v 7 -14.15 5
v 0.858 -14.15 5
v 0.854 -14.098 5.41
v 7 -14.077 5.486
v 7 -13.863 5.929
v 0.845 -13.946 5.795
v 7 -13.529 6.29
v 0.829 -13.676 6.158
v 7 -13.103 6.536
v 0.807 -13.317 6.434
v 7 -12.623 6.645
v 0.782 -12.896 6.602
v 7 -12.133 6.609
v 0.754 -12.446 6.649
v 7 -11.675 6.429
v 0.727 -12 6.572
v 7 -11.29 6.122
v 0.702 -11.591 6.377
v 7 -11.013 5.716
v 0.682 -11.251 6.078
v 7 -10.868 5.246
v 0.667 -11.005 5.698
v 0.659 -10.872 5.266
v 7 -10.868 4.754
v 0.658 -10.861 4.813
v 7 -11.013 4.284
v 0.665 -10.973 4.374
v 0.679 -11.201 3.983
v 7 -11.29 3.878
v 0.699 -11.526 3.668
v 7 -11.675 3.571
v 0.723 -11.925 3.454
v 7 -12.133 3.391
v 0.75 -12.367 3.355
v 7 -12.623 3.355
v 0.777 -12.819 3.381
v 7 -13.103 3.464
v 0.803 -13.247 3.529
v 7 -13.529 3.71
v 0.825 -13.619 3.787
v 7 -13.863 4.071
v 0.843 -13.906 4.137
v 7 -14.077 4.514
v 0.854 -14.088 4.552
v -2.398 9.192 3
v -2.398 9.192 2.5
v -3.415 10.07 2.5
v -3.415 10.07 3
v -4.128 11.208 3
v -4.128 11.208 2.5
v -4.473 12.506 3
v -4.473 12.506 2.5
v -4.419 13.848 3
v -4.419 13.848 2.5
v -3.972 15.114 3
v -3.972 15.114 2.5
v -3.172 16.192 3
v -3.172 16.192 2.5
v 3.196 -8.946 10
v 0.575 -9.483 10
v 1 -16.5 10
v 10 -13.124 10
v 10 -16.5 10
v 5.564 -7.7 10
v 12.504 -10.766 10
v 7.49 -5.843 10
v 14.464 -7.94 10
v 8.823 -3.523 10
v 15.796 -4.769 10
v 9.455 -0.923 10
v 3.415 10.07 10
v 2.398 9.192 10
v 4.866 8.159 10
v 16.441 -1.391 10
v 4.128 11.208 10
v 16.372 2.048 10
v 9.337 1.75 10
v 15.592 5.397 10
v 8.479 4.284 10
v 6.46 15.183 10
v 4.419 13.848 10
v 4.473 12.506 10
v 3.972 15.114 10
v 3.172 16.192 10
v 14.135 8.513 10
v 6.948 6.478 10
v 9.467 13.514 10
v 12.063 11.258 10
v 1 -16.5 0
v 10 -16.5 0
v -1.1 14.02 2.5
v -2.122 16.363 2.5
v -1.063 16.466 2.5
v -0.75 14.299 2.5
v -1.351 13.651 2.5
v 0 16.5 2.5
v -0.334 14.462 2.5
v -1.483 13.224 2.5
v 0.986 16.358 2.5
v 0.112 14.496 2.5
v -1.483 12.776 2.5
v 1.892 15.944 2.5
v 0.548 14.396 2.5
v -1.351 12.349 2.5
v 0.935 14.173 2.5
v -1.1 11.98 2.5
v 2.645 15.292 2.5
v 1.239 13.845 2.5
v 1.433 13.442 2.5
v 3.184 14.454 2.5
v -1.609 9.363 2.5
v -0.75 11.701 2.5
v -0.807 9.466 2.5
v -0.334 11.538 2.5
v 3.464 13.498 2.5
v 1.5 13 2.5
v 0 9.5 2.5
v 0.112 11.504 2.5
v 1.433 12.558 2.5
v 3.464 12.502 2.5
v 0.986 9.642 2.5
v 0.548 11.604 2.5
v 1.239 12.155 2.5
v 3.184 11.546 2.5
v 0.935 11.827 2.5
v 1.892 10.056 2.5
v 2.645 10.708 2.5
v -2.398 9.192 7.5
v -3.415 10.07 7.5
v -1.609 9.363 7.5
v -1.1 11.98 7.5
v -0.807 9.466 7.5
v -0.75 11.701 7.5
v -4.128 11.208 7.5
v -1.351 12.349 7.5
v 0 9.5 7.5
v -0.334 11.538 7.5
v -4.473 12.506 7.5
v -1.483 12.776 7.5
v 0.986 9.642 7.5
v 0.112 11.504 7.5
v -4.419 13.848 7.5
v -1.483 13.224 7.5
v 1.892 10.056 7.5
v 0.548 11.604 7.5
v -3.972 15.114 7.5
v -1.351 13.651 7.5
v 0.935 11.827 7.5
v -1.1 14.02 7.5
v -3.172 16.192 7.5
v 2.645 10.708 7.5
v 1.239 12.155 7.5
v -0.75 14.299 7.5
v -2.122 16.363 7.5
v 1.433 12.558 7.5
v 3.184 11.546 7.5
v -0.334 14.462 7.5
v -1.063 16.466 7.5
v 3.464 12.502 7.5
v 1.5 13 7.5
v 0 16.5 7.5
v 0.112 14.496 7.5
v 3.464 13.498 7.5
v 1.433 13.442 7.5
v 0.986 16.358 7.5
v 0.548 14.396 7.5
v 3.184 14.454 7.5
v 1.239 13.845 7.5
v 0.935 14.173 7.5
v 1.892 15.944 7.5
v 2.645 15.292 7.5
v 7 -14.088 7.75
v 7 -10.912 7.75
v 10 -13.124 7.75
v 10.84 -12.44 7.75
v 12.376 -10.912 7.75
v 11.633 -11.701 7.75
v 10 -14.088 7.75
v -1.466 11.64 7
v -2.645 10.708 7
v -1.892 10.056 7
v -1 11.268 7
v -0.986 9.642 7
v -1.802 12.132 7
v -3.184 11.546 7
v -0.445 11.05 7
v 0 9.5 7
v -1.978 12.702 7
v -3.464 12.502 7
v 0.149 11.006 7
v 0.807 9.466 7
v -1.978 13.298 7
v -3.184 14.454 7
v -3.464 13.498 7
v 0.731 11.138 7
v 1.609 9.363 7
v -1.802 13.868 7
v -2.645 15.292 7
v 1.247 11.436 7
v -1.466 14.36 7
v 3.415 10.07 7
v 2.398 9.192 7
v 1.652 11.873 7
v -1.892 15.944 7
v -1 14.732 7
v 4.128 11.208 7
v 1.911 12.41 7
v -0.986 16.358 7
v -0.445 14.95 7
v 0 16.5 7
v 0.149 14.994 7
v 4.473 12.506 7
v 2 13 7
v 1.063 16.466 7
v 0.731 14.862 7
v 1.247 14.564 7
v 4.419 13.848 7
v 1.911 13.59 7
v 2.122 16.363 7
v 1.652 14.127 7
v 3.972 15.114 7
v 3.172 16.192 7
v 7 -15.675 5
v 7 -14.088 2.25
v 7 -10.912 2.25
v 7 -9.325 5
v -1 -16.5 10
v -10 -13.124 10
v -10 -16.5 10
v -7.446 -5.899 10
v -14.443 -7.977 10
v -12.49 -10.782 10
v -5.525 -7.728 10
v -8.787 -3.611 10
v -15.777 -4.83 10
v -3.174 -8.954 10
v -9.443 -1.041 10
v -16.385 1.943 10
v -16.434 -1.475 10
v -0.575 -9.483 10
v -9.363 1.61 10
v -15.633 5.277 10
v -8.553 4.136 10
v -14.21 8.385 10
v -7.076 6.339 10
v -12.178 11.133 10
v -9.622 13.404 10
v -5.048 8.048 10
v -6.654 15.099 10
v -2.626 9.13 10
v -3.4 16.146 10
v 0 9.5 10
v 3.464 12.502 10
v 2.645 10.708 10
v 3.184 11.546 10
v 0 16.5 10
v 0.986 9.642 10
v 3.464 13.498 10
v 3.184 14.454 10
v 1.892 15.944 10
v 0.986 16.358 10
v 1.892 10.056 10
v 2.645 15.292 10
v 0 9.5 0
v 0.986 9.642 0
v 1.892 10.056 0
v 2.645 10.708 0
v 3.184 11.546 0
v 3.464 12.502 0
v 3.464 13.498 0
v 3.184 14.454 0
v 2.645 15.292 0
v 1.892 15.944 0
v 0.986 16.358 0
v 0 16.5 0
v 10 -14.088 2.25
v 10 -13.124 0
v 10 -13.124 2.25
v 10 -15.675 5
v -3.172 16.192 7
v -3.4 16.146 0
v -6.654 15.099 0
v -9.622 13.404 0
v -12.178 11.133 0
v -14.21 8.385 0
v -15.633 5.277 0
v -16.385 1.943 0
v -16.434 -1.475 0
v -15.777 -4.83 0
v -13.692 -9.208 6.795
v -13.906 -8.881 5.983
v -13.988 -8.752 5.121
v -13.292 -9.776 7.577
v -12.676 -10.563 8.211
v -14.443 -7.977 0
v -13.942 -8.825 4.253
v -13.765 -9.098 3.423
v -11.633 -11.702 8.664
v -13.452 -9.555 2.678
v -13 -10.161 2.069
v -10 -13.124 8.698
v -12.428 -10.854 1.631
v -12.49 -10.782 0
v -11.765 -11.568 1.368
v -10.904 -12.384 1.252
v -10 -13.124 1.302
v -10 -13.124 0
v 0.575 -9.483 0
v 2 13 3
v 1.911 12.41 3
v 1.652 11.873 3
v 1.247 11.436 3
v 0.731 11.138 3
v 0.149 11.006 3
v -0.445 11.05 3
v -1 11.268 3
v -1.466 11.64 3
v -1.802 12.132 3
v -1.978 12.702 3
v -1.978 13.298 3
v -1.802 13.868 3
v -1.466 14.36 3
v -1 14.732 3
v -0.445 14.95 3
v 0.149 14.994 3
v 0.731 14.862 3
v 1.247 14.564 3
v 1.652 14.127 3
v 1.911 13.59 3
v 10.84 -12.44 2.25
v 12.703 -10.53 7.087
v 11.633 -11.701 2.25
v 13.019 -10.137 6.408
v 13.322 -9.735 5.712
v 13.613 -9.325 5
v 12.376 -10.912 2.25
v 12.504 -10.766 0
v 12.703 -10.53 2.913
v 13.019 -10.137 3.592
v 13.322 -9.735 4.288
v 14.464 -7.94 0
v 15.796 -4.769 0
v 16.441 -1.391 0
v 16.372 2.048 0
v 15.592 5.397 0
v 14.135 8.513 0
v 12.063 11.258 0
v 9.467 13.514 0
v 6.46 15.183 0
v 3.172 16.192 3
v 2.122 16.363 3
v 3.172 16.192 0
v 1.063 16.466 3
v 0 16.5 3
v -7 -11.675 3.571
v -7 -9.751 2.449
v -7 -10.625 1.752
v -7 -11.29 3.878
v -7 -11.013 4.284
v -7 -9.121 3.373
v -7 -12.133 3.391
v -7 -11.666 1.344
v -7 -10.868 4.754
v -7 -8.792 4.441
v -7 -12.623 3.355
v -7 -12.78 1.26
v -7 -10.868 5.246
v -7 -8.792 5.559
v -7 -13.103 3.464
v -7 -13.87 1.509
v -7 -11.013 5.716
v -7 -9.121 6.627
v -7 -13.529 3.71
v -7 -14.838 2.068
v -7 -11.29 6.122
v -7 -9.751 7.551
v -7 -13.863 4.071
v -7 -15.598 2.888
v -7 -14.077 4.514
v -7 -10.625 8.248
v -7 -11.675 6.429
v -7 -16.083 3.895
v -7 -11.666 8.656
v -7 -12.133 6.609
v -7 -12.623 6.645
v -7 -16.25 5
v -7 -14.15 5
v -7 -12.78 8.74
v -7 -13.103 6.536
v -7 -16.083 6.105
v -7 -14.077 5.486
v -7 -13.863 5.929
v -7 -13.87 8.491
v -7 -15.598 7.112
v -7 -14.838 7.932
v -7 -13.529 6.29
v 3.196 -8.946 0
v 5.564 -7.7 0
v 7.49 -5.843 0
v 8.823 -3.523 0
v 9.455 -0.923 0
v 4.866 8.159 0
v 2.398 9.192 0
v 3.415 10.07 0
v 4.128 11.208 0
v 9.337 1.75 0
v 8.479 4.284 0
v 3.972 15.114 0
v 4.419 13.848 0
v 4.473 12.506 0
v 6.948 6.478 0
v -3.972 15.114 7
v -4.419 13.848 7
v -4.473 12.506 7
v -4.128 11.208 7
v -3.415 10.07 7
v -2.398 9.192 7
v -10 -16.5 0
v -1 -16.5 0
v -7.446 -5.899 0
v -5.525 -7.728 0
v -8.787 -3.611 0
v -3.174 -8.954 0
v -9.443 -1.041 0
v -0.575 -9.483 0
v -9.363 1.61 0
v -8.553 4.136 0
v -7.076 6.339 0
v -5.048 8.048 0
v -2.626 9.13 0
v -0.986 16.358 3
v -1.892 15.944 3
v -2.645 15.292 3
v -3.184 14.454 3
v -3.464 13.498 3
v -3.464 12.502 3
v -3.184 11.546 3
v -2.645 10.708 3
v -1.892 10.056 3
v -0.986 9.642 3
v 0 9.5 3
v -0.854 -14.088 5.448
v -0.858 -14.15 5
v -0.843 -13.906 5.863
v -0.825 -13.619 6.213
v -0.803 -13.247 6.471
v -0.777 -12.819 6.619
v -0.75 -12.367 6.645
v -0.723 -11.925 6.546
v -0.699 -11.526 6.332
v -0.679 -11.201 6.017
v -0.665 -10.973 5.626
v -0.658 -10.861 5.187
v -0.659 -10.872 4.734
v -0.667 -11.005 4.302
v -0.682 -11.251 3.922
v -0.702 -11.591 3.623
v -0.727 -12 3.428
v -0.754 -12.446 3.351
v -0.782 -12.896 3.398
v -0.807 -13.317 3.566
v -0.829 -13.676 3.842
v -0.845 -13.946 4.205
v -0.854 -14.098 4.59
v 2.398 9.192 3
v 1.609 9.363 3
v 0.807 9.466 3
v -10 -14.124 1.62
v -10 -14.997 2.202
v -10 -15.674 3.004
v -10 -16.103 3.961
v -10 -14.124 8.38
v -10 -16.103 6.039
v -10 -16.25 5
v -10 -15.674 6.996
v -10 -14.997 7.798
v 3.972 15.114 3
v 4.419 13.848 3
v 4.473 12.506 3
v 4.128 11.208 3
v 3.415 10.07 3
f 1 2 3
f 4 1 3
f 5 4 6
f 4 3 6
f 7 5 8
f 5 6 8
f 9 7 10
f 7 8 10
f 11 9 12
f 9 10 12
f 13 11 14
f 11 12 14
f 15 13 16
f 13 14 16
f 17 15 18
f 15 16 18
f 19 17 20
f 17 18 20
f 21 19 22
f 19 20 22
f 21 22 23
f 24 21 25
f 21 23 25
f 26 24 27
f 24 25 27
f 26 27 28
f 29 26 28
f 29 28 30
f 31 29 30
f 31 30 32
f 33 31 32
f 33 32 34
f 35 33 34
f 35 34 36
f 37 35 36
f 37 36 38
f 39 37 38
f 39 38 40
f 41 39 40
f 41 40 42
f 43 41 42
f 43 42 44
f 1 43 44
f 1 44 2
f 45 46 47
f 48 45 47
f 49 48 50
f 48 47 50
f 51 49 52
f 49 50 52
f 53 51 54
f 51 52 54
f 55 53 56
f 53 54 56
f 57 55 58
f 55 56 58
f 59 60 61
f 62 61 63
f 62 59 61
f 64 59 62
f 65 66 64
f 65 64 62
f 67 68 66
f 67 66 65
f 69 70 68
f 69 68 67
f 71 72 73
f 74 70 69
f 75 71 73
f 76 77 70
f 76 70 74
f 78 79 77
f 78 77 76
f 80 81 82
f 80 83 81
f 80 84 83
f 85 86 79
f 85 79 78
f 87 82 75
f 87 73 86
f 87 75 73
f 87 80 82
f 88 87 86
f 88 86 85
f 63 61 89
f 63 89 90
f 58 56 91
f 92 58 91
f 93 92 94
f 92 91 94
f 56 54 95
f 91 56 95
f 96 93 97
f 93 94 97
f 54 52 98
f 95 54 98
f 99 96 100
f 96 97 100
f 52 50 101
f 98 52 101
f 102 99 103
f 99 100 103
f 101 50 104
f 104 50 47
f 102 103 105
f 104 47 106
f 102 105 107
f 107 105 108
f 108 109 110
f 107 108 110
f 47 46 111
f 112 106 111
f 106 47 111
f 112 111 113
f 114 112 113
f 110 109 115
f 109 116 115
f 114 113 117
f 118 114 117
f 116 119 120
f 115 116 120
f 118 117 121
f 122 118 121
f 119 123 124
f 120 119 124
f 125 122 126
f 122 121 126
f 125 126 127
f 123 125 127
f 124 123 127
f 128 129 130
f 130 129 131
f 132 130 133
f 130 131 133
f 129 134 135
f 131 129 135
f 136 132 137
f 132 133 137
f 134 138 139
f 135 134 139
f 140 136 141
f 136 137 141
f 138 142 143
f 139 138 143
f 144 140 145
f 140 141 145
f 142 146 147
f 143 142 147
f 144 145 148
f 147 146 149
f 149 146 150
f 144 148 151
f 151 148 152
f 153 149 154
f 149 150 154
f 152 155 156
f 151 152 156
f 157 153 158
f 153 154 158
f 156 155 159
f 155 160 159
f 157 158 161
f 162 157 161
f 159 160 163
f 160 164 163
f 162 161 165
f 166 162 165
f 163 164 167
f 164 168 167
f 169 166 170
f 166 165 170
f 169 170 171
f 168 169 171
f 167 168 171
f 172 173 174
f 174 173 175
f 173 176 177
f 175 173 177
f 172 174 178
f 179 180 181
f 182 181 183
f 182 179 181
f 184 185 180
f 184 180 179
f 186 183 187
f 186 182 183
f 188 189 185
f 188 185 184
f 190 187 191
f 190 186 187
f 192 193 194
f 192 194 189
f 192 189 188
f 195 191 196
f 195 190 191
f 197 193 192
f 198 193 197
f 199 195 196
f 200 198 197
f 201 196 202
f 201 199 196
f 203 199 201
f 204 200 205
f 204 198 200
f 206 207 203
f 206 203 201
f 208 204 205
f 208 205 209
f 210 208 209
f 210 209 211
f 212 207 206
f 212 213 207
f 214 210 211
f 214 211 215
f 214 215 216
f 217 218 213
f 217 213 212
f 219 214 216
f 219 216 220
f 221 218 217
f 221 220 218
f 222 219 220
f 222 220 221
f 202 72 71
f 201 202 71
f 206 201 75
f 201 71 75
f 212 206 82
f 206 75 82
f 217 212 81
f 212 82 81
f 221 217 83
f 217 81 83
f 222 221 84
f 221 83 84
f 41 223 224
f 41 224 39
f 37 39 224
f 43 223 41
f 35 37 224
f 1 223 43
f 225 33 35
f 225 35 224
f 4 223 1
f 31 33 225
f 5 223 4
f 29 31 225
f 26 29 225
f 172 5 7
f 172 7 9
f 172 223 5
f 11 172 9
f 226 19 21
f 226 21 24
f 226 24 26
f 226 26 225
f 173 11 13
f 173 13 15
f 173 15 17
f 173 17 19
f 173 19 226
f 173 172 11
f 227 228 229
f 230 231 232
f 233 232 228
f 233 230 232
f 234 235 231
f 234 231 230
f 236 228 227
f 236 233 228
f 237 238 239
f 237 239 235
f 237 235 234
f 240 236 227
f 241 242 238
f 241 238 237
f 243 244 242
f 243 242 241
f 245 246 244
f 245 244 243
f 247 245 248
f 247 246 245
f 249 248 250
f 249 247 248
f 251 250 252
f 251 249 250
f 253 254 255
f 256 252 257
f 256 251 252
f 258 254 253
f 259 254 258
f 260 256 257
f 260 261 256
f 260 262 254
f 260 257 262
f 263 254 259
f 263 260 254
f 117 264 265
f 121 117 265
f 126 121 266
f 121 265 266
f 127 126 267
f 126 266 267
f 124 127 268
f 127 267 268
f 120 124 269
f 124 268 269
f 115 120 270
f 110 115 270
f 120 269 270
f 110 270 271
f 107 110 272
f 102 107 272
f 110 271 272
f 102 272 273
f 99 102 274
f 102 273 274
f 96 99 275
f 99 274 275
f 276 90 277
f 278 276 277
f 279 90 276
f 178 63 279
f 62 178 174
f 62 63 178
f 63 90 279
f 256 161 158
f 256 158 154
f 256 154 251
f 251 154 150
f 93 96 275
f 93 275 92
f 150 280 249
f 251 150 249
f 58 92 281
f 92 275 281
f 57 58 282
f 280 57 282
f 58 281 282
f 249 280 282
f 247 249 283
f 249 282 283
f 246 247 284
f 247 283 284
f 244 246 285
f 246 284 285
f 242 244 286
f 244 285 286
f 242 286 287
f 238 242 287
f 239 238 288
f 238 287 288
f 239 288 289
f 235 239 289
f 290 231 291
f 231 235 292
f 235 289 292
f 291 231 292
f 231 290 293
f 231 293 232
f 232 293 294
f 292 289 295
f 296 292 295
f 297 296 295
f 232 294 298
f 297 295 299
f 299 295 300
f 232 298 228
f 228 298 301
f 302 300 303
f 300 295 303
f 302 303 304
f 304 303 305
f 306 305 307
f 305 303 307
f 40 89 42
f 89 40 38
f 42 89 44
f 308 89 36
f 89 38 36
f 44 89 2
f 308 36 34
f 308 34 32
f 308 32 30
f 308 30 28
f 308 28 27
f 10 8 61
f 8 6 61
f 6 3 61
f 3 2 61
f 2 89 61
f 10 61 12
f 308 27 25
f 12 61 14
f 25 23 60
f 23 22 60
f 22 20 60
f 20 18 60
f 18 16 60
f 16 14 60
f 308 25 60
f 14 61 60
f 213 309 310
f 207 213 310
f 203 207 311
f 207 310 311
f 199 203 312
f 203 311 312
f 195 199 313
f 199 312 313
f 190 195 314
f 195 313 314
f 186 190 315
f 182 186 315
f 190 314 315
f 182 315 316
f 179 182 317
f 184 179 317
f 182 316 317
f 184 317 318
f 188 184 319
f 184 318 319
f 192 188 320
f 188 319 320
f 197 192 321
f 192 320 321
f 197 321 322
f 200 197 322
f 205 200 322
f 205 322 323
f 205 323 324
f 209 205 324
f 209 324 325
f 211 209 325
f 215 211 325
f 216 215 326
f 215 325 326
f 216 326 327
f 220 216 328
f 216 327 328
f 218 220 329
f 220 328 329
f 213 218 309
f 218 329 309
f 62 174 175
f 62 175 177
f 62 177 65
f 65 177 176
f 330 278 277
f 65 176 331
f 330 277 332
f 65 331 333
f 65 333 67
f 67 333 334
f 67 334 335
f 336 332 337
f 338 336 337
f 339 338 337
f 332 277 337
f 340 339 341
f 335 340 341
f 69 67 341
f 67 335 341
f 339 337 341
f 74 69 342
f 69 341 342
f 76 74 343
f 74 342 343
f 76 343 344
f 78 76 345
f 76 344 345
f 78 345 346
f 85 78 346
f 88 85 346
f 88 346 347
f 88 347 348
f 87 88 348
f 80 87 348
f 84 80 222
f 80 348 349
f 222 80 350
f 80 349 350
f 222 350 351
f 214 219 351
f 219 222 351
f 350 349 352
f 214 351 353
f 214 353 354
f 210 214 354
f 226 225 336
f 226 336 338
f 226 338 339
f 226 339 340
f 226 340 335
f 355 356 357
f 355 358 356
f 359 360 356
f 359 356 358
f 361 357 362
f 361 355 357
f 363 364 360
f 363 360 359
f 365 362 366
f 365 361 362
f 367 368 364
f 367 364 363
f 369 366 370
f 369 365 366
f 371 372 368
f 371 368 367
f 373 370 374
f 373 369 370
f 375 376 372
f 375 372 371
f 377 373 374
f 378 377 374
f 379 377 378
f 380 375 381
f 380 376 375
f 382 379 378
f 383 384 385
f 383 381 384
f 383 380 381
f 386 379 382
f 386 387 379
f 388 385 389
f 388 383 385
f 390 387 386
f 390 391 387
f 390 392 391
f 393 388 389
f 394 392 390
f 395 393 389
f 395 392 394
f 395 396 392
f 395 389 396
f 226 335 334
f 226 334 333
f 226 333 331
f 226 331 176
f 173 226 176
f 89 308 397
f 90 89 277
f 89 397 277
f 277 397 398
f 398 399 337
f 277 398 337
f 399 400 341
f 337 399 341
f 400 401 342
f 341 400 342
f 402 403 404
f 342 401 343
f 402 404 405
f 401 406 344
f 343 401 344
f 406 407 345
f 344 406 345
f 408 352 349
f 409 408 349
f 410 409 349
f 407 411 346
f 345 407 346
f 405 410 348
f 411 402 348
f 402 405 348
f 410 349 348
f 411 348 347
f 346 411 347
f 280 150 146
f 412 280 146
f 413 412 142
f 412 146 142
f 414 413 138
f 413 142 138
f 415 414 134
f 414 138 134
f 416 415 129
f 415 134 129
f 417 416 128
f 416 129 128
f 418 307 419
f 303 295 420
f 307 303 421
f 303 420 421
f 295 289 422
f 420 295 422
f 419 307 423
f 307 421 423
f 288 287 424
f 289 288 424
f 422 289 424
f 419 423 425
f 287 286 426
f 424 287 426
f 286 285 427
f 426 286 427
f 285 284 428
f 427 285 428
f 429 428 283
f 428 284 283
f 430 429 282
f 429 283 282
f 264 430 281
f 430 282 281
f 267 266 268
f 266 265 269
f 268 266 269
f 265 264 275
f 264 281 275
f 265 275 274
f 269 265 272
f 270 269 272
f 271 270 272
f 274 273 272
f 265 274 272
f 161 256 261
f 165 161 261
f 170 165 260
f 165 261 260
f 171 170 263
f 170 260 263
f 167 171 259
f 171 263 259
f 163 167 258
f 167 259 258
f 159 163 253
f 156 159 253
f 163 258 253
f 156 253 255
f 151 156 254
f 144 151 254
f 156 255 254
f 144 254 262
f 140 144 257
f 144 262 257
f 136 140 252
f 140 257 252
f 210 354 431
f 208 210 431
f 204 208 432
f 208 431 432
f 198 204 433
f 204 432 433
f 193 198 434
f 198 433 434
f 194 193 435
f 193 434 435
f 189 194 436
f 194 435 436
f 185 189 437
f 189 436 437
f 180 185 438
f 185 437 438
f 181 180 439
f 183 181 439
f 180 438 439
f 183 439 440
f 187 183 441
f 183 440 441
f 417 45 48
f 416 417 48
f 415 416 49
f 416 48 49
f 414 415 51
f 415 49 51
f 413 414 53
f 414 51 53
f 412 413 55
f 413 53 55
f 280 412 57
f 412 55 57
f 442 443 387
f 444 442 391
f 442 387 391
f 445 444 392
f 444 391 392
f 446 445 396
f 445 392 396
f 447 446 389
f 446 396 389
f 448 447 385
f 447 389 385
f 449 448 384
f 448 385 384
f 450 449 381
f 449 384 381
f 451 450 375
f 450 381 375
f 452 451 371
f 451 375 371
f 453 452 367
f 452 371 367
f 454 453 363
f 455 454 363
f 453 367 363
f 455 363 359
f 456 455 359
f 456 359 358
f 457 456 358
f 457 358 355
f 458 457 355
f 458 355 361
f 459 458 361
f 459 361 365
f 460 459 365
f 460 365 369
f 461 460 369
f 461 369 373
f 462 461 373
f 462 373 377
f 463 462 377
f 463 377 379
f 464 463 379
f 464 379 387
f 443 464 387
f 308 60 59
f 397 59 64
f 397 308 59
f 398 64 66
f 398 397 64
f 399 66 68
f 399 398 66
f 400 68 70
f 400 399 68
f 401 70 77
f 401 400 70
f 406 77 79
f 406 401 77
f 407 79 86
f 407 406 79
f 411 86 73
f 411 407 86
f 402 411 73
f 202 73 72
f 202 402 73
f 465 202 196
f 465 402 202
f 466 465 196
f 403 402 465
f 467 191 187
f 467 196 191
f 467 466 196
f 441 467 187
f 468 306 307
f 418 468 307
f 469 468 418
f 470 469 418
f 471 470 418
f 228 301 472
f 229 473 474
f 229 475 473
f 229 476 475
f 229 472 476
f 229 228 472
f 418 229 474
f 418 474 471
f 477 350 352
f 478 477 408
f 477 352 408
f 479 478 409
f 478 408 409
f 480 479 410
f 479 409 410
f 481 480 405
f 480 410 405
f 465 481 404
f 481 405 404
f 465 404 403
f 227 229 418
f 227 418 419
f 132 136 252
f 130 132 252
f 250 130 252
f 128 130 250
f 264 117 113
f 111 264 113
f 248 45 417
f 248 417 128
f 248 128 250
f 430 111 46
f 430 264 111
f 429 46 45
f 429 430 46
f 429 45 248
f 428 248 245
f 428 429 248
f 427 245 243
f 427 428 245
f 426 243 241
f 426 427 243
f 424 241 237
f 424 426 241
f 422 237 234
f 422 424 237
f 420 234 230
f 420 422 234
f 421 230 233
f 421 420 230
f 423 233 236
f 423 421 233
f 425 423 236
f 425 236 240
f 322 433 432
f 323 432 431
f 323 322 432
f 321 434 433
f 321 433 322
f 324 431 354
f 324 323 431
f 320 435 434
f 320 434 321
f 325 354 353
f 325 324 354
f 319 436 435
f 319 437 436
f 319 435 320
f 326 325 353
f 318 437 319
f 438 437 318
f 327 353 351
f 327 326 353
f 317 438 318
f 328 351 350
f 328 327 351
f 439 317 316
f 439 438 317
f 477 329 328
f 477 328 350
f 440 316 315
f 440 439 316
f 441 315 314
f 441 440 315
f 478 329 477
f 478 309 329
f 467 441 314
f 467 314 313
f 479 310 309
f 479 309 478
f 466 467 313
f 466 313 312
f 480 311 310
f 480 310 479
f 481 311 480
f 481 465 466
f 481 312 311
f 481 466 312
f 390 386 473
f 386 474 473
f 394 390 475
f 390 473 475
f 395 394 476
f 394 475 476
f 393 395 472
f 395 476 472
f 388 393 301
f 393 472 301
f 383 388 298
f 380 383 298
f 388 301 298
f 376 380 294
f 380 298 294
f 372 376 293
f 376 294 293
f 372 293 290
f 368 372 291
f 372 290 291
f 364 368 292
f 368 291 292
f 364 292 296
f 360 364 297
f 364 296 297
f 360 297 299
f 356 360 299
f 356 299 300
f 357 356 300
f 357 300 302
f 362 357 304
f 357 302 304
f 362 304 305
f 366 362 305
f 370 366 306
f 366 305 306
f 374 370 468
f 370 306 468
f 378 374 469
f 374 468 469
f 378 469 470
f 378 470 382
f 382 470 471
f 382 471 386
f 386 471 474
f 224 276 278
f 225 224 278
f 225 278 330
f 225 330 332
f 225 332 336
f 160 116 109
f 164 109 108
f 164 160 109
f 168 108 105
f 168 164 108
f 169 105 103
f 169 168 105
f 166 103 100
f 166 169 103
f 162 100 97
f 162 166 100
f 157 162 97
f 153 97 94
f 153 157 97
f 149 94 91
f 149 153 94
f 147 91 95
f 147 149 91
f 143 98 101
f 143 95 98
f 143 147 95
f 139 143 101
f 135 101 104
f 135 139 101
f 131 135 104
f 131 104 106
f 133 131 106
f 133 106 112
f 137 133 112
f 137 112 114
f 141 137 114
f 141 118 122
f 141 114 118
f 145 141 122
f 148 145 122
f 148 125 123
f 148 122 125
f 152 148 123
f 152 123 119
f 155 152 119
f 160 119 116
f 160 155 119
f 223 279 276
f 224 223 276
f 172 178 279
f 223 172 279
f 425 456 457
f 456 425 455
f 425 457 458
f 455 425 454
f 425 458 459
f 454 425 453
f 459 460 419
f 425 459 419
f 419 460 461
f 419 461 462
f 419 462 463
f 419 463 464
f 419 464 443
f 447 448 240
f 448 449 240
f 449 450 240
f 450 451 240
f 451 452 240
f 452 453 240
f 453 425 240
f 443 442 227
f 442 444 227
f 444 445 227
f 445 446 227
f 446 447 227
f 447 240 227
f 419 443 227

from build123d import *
from build123d import SkipClean  # not in build123d's __all__

# Parameters (mm, degrees)
F0_R           = 16.5
F0_R_2         = 9.5
F1_DEPTH       = 10
F3_DEPTH       = 2.5
F4_R           = 4.5
F4_R_2         = 1.5
F5_DEPTH       = 0.5
F7_DEPTH       = 2.5
F8_R           = 4.5
F8_R_2         = 1.5
F9_DEPTH       = 0.5
F10_R          = 2
F10_R_2        = 1.5
F11_DEPTH      = 4
F13_DEPTH      = 10
F15_DEPTH      = 10.001
F16_R          = 1.65
F17_DEPTH      = 20
F19_DEPTH      = 3
F19_DEPTH_BACK = 10
F20_R          = 3.75
F21_DEPTH      = 3
F21_DEPTH_BACK = 25


# Not quite as in the source:
# - after a boolean that leaves OpenCascade's solid faulty, fix() repairs it
# - a feature names something its author has since deleted; it is built from what else it names


with BuildPart() as f1:
    # F0 (on Top) → F1 (new body)
    with BuildSketch(Plane.XY):
        Circle(F0_R)
        Circle(F0_R_2, mode=Mode.SUBTRACT)
    extrude(amount=F1_DEPTH)

    # F2 (on face) → F3 (cut)
    with BuildSketch(Plane.XY.offset(10)):
        with BuildLine():
            ThreePointArc((0, 16.5), (3.5, 13), (0, 9.5))
            Line((0, 9.5), (0, 8.5))
            ThreePointArc((0, 8.5), (4.5, 13), (0, 17.5))
            Line((0, 17.5), (0, 16.5))
        make_face()
    extrude(amount=-F3_DEPTH, mode=Mode.SUBTRACT)

    # F4 (on face) → F5 (cut)
    with BuildSketch(Plane.XY.offset(7.5)):
        with Locations((0, 13)):
            Circle(F4_R)
        with Locations((0, 13)):
            Circle(F4_R_2, mode=Mode.SUBTRACT)
    extrude(amount=-F5_DEPTH, mode=Mode.SUBTRACT)

    # F6 (on face) → F7 (cut)
    with BuildSketch(Plane(origin=(0, 0, 0), x_dir=(1, 0, 0), z_dir=(0, 0, -1))):
        with BuildLine():
            ThreePointArc((0, -9.5), (3.5, -13), (0, -16.5))
            Line((0, -16.5), (0, -17.5))
            ThreePointArc((0, -17.5), (4.5, -13), (0, -8.5))
            Line((0, -8.5), (0, -9.5))
        make_face()
    extrude(amount=-F7_DEPTH, mode=Mode.SUBTRACT)

    # F8 (on face) → F9 (cut)
    with BuildSketch(Plane(origin=(0, 0, 2.5), x_dir=(1, 0, 0), z_dir=(0, 0, -1))):
        with Locations((0, -13)):
            Circle(F8_R)
        with Locations((0, -13)):
            Circle(F8_R_2, mode=Mode.SUBTRACT)
    extrude(amount=-F9_DEPTH, mode=Mode.SUBTRACT)

    # F10 (on face) → F11 (cut, through all)
    with BuildSketch(Plane(origin=(0, 0, 3), x_dir=(1, 0, 0), z_dir=(0, 0, -1))):
        with BuildLine():
            ThreePointArc((0, -16.5), (-3.5, -13), (0, -9.5))
            ThreePointArc((0, -9.5), (-1.2089410497, -9.4227629461), (-2.3982241951, -9.1923076923))
            ThreePointArc((-2.3982241951, -9.1923076923), (-4.472783282, -12.5058242088), (-3.171619712, -16.1923076923))
            ThreePointArc((-3.171619712, -16.1923076923), (-1.5932550136, -16.4228967744), (0, -16.5))
        make_face()
        with Locations((0, -13)):
            Circle(F10_R)
        with Locations((0, -13)):
            Circle(F10_R_2, mode=Mode.SUBTRACT)
    with SkipClean():  # cleaning this boolean's faces spoils the solid; the shape is the same uncleaned
        extrude(amount=-F11_DEPTH, mode=Mode.SUBTRACT)

    # F12 (on face) → F13 (join, through all)
    with BuildSketch(Plane.XY.offset(10)):
        with BuildLine():
            Line((-10, -13.1244047484), (-10, -16.5))
            Line((-10, -16.5), (0, -16.5))
            ThreePointArc((0, -16.5), (-5.2771830389, -15.6333406275), (-10, -13.1244047484))
        make_face()
        with BuildLine():
            ThreePointArc((10, -13.1244047484), (5.2771830389, -15.6333406275), (0, -16.5))
            Line((0, -16.5), (10, -16.5))
            Line((10, -16.5), (10, -13.1244047484))
        make_face()
    extrude(amount=-F13_DEPTH)

    add(f1.part.fix(), mode=Mode.REPLACE)

    # F14 (on face) → F15 (cut, through all)
    with BuildSketch(Plane.XY.offset(10)):
        Polygon((1, -16.5), (0, 0), (-1, -16.5), align=None)
    extrude(amount=-F15_DEPTH, mode=Mode.SUBTRACT)

    # F16 (on face) → F17 (cut, through all)
    with BuildSketch(Plane(origin=(-10, 0, 0), x_dir=(0, -1, 0), z_dir=(-1, 0, 0))):
        with Locations((12.5, 5)):
            Circle(F16_R)
    extrude(amount=-F17_DEPTH, mode=Mode.SUBTRACT)

    # F18 (on face) → F19 (cut, two sides)
    with BuildSketch(Plane.YZ.offset(10)) as f19_sk:
        Polygon((-10.9122867597, 2.25), (-9.3245735195, 5), (-10.9122867597, 7.75), (-14.0877132403, 7.75), (-15.6754264805, 5), (-14.0877132403, 2.25), align=None)
    extrude(amount=-F19_DEPTH, mode=Mode.SUBTRACT)
    extrude(f19_sk.sketch, amount=F19_DEPTH_BACK, mode=Mode.SUBTRACT)

    # F20 (on face) → F21 (cut, two sides)
    with BuildSketch(Plane(origin=(-10, 0, 0), x_dir=(0, -1, 0), z_dir=(-1, 0, 0))) as f21_sk:
        with Locations((12.5, 5)):
            Circle(F20_R)
    extrude(amount=-F21_DEPTH, mode=Mode.SUBTRACT)
    extrude(f21_sk.sketch, amount=F21_DEPTH_BACK, mode=Mode.SUBTRACT)


solid = f1.part
